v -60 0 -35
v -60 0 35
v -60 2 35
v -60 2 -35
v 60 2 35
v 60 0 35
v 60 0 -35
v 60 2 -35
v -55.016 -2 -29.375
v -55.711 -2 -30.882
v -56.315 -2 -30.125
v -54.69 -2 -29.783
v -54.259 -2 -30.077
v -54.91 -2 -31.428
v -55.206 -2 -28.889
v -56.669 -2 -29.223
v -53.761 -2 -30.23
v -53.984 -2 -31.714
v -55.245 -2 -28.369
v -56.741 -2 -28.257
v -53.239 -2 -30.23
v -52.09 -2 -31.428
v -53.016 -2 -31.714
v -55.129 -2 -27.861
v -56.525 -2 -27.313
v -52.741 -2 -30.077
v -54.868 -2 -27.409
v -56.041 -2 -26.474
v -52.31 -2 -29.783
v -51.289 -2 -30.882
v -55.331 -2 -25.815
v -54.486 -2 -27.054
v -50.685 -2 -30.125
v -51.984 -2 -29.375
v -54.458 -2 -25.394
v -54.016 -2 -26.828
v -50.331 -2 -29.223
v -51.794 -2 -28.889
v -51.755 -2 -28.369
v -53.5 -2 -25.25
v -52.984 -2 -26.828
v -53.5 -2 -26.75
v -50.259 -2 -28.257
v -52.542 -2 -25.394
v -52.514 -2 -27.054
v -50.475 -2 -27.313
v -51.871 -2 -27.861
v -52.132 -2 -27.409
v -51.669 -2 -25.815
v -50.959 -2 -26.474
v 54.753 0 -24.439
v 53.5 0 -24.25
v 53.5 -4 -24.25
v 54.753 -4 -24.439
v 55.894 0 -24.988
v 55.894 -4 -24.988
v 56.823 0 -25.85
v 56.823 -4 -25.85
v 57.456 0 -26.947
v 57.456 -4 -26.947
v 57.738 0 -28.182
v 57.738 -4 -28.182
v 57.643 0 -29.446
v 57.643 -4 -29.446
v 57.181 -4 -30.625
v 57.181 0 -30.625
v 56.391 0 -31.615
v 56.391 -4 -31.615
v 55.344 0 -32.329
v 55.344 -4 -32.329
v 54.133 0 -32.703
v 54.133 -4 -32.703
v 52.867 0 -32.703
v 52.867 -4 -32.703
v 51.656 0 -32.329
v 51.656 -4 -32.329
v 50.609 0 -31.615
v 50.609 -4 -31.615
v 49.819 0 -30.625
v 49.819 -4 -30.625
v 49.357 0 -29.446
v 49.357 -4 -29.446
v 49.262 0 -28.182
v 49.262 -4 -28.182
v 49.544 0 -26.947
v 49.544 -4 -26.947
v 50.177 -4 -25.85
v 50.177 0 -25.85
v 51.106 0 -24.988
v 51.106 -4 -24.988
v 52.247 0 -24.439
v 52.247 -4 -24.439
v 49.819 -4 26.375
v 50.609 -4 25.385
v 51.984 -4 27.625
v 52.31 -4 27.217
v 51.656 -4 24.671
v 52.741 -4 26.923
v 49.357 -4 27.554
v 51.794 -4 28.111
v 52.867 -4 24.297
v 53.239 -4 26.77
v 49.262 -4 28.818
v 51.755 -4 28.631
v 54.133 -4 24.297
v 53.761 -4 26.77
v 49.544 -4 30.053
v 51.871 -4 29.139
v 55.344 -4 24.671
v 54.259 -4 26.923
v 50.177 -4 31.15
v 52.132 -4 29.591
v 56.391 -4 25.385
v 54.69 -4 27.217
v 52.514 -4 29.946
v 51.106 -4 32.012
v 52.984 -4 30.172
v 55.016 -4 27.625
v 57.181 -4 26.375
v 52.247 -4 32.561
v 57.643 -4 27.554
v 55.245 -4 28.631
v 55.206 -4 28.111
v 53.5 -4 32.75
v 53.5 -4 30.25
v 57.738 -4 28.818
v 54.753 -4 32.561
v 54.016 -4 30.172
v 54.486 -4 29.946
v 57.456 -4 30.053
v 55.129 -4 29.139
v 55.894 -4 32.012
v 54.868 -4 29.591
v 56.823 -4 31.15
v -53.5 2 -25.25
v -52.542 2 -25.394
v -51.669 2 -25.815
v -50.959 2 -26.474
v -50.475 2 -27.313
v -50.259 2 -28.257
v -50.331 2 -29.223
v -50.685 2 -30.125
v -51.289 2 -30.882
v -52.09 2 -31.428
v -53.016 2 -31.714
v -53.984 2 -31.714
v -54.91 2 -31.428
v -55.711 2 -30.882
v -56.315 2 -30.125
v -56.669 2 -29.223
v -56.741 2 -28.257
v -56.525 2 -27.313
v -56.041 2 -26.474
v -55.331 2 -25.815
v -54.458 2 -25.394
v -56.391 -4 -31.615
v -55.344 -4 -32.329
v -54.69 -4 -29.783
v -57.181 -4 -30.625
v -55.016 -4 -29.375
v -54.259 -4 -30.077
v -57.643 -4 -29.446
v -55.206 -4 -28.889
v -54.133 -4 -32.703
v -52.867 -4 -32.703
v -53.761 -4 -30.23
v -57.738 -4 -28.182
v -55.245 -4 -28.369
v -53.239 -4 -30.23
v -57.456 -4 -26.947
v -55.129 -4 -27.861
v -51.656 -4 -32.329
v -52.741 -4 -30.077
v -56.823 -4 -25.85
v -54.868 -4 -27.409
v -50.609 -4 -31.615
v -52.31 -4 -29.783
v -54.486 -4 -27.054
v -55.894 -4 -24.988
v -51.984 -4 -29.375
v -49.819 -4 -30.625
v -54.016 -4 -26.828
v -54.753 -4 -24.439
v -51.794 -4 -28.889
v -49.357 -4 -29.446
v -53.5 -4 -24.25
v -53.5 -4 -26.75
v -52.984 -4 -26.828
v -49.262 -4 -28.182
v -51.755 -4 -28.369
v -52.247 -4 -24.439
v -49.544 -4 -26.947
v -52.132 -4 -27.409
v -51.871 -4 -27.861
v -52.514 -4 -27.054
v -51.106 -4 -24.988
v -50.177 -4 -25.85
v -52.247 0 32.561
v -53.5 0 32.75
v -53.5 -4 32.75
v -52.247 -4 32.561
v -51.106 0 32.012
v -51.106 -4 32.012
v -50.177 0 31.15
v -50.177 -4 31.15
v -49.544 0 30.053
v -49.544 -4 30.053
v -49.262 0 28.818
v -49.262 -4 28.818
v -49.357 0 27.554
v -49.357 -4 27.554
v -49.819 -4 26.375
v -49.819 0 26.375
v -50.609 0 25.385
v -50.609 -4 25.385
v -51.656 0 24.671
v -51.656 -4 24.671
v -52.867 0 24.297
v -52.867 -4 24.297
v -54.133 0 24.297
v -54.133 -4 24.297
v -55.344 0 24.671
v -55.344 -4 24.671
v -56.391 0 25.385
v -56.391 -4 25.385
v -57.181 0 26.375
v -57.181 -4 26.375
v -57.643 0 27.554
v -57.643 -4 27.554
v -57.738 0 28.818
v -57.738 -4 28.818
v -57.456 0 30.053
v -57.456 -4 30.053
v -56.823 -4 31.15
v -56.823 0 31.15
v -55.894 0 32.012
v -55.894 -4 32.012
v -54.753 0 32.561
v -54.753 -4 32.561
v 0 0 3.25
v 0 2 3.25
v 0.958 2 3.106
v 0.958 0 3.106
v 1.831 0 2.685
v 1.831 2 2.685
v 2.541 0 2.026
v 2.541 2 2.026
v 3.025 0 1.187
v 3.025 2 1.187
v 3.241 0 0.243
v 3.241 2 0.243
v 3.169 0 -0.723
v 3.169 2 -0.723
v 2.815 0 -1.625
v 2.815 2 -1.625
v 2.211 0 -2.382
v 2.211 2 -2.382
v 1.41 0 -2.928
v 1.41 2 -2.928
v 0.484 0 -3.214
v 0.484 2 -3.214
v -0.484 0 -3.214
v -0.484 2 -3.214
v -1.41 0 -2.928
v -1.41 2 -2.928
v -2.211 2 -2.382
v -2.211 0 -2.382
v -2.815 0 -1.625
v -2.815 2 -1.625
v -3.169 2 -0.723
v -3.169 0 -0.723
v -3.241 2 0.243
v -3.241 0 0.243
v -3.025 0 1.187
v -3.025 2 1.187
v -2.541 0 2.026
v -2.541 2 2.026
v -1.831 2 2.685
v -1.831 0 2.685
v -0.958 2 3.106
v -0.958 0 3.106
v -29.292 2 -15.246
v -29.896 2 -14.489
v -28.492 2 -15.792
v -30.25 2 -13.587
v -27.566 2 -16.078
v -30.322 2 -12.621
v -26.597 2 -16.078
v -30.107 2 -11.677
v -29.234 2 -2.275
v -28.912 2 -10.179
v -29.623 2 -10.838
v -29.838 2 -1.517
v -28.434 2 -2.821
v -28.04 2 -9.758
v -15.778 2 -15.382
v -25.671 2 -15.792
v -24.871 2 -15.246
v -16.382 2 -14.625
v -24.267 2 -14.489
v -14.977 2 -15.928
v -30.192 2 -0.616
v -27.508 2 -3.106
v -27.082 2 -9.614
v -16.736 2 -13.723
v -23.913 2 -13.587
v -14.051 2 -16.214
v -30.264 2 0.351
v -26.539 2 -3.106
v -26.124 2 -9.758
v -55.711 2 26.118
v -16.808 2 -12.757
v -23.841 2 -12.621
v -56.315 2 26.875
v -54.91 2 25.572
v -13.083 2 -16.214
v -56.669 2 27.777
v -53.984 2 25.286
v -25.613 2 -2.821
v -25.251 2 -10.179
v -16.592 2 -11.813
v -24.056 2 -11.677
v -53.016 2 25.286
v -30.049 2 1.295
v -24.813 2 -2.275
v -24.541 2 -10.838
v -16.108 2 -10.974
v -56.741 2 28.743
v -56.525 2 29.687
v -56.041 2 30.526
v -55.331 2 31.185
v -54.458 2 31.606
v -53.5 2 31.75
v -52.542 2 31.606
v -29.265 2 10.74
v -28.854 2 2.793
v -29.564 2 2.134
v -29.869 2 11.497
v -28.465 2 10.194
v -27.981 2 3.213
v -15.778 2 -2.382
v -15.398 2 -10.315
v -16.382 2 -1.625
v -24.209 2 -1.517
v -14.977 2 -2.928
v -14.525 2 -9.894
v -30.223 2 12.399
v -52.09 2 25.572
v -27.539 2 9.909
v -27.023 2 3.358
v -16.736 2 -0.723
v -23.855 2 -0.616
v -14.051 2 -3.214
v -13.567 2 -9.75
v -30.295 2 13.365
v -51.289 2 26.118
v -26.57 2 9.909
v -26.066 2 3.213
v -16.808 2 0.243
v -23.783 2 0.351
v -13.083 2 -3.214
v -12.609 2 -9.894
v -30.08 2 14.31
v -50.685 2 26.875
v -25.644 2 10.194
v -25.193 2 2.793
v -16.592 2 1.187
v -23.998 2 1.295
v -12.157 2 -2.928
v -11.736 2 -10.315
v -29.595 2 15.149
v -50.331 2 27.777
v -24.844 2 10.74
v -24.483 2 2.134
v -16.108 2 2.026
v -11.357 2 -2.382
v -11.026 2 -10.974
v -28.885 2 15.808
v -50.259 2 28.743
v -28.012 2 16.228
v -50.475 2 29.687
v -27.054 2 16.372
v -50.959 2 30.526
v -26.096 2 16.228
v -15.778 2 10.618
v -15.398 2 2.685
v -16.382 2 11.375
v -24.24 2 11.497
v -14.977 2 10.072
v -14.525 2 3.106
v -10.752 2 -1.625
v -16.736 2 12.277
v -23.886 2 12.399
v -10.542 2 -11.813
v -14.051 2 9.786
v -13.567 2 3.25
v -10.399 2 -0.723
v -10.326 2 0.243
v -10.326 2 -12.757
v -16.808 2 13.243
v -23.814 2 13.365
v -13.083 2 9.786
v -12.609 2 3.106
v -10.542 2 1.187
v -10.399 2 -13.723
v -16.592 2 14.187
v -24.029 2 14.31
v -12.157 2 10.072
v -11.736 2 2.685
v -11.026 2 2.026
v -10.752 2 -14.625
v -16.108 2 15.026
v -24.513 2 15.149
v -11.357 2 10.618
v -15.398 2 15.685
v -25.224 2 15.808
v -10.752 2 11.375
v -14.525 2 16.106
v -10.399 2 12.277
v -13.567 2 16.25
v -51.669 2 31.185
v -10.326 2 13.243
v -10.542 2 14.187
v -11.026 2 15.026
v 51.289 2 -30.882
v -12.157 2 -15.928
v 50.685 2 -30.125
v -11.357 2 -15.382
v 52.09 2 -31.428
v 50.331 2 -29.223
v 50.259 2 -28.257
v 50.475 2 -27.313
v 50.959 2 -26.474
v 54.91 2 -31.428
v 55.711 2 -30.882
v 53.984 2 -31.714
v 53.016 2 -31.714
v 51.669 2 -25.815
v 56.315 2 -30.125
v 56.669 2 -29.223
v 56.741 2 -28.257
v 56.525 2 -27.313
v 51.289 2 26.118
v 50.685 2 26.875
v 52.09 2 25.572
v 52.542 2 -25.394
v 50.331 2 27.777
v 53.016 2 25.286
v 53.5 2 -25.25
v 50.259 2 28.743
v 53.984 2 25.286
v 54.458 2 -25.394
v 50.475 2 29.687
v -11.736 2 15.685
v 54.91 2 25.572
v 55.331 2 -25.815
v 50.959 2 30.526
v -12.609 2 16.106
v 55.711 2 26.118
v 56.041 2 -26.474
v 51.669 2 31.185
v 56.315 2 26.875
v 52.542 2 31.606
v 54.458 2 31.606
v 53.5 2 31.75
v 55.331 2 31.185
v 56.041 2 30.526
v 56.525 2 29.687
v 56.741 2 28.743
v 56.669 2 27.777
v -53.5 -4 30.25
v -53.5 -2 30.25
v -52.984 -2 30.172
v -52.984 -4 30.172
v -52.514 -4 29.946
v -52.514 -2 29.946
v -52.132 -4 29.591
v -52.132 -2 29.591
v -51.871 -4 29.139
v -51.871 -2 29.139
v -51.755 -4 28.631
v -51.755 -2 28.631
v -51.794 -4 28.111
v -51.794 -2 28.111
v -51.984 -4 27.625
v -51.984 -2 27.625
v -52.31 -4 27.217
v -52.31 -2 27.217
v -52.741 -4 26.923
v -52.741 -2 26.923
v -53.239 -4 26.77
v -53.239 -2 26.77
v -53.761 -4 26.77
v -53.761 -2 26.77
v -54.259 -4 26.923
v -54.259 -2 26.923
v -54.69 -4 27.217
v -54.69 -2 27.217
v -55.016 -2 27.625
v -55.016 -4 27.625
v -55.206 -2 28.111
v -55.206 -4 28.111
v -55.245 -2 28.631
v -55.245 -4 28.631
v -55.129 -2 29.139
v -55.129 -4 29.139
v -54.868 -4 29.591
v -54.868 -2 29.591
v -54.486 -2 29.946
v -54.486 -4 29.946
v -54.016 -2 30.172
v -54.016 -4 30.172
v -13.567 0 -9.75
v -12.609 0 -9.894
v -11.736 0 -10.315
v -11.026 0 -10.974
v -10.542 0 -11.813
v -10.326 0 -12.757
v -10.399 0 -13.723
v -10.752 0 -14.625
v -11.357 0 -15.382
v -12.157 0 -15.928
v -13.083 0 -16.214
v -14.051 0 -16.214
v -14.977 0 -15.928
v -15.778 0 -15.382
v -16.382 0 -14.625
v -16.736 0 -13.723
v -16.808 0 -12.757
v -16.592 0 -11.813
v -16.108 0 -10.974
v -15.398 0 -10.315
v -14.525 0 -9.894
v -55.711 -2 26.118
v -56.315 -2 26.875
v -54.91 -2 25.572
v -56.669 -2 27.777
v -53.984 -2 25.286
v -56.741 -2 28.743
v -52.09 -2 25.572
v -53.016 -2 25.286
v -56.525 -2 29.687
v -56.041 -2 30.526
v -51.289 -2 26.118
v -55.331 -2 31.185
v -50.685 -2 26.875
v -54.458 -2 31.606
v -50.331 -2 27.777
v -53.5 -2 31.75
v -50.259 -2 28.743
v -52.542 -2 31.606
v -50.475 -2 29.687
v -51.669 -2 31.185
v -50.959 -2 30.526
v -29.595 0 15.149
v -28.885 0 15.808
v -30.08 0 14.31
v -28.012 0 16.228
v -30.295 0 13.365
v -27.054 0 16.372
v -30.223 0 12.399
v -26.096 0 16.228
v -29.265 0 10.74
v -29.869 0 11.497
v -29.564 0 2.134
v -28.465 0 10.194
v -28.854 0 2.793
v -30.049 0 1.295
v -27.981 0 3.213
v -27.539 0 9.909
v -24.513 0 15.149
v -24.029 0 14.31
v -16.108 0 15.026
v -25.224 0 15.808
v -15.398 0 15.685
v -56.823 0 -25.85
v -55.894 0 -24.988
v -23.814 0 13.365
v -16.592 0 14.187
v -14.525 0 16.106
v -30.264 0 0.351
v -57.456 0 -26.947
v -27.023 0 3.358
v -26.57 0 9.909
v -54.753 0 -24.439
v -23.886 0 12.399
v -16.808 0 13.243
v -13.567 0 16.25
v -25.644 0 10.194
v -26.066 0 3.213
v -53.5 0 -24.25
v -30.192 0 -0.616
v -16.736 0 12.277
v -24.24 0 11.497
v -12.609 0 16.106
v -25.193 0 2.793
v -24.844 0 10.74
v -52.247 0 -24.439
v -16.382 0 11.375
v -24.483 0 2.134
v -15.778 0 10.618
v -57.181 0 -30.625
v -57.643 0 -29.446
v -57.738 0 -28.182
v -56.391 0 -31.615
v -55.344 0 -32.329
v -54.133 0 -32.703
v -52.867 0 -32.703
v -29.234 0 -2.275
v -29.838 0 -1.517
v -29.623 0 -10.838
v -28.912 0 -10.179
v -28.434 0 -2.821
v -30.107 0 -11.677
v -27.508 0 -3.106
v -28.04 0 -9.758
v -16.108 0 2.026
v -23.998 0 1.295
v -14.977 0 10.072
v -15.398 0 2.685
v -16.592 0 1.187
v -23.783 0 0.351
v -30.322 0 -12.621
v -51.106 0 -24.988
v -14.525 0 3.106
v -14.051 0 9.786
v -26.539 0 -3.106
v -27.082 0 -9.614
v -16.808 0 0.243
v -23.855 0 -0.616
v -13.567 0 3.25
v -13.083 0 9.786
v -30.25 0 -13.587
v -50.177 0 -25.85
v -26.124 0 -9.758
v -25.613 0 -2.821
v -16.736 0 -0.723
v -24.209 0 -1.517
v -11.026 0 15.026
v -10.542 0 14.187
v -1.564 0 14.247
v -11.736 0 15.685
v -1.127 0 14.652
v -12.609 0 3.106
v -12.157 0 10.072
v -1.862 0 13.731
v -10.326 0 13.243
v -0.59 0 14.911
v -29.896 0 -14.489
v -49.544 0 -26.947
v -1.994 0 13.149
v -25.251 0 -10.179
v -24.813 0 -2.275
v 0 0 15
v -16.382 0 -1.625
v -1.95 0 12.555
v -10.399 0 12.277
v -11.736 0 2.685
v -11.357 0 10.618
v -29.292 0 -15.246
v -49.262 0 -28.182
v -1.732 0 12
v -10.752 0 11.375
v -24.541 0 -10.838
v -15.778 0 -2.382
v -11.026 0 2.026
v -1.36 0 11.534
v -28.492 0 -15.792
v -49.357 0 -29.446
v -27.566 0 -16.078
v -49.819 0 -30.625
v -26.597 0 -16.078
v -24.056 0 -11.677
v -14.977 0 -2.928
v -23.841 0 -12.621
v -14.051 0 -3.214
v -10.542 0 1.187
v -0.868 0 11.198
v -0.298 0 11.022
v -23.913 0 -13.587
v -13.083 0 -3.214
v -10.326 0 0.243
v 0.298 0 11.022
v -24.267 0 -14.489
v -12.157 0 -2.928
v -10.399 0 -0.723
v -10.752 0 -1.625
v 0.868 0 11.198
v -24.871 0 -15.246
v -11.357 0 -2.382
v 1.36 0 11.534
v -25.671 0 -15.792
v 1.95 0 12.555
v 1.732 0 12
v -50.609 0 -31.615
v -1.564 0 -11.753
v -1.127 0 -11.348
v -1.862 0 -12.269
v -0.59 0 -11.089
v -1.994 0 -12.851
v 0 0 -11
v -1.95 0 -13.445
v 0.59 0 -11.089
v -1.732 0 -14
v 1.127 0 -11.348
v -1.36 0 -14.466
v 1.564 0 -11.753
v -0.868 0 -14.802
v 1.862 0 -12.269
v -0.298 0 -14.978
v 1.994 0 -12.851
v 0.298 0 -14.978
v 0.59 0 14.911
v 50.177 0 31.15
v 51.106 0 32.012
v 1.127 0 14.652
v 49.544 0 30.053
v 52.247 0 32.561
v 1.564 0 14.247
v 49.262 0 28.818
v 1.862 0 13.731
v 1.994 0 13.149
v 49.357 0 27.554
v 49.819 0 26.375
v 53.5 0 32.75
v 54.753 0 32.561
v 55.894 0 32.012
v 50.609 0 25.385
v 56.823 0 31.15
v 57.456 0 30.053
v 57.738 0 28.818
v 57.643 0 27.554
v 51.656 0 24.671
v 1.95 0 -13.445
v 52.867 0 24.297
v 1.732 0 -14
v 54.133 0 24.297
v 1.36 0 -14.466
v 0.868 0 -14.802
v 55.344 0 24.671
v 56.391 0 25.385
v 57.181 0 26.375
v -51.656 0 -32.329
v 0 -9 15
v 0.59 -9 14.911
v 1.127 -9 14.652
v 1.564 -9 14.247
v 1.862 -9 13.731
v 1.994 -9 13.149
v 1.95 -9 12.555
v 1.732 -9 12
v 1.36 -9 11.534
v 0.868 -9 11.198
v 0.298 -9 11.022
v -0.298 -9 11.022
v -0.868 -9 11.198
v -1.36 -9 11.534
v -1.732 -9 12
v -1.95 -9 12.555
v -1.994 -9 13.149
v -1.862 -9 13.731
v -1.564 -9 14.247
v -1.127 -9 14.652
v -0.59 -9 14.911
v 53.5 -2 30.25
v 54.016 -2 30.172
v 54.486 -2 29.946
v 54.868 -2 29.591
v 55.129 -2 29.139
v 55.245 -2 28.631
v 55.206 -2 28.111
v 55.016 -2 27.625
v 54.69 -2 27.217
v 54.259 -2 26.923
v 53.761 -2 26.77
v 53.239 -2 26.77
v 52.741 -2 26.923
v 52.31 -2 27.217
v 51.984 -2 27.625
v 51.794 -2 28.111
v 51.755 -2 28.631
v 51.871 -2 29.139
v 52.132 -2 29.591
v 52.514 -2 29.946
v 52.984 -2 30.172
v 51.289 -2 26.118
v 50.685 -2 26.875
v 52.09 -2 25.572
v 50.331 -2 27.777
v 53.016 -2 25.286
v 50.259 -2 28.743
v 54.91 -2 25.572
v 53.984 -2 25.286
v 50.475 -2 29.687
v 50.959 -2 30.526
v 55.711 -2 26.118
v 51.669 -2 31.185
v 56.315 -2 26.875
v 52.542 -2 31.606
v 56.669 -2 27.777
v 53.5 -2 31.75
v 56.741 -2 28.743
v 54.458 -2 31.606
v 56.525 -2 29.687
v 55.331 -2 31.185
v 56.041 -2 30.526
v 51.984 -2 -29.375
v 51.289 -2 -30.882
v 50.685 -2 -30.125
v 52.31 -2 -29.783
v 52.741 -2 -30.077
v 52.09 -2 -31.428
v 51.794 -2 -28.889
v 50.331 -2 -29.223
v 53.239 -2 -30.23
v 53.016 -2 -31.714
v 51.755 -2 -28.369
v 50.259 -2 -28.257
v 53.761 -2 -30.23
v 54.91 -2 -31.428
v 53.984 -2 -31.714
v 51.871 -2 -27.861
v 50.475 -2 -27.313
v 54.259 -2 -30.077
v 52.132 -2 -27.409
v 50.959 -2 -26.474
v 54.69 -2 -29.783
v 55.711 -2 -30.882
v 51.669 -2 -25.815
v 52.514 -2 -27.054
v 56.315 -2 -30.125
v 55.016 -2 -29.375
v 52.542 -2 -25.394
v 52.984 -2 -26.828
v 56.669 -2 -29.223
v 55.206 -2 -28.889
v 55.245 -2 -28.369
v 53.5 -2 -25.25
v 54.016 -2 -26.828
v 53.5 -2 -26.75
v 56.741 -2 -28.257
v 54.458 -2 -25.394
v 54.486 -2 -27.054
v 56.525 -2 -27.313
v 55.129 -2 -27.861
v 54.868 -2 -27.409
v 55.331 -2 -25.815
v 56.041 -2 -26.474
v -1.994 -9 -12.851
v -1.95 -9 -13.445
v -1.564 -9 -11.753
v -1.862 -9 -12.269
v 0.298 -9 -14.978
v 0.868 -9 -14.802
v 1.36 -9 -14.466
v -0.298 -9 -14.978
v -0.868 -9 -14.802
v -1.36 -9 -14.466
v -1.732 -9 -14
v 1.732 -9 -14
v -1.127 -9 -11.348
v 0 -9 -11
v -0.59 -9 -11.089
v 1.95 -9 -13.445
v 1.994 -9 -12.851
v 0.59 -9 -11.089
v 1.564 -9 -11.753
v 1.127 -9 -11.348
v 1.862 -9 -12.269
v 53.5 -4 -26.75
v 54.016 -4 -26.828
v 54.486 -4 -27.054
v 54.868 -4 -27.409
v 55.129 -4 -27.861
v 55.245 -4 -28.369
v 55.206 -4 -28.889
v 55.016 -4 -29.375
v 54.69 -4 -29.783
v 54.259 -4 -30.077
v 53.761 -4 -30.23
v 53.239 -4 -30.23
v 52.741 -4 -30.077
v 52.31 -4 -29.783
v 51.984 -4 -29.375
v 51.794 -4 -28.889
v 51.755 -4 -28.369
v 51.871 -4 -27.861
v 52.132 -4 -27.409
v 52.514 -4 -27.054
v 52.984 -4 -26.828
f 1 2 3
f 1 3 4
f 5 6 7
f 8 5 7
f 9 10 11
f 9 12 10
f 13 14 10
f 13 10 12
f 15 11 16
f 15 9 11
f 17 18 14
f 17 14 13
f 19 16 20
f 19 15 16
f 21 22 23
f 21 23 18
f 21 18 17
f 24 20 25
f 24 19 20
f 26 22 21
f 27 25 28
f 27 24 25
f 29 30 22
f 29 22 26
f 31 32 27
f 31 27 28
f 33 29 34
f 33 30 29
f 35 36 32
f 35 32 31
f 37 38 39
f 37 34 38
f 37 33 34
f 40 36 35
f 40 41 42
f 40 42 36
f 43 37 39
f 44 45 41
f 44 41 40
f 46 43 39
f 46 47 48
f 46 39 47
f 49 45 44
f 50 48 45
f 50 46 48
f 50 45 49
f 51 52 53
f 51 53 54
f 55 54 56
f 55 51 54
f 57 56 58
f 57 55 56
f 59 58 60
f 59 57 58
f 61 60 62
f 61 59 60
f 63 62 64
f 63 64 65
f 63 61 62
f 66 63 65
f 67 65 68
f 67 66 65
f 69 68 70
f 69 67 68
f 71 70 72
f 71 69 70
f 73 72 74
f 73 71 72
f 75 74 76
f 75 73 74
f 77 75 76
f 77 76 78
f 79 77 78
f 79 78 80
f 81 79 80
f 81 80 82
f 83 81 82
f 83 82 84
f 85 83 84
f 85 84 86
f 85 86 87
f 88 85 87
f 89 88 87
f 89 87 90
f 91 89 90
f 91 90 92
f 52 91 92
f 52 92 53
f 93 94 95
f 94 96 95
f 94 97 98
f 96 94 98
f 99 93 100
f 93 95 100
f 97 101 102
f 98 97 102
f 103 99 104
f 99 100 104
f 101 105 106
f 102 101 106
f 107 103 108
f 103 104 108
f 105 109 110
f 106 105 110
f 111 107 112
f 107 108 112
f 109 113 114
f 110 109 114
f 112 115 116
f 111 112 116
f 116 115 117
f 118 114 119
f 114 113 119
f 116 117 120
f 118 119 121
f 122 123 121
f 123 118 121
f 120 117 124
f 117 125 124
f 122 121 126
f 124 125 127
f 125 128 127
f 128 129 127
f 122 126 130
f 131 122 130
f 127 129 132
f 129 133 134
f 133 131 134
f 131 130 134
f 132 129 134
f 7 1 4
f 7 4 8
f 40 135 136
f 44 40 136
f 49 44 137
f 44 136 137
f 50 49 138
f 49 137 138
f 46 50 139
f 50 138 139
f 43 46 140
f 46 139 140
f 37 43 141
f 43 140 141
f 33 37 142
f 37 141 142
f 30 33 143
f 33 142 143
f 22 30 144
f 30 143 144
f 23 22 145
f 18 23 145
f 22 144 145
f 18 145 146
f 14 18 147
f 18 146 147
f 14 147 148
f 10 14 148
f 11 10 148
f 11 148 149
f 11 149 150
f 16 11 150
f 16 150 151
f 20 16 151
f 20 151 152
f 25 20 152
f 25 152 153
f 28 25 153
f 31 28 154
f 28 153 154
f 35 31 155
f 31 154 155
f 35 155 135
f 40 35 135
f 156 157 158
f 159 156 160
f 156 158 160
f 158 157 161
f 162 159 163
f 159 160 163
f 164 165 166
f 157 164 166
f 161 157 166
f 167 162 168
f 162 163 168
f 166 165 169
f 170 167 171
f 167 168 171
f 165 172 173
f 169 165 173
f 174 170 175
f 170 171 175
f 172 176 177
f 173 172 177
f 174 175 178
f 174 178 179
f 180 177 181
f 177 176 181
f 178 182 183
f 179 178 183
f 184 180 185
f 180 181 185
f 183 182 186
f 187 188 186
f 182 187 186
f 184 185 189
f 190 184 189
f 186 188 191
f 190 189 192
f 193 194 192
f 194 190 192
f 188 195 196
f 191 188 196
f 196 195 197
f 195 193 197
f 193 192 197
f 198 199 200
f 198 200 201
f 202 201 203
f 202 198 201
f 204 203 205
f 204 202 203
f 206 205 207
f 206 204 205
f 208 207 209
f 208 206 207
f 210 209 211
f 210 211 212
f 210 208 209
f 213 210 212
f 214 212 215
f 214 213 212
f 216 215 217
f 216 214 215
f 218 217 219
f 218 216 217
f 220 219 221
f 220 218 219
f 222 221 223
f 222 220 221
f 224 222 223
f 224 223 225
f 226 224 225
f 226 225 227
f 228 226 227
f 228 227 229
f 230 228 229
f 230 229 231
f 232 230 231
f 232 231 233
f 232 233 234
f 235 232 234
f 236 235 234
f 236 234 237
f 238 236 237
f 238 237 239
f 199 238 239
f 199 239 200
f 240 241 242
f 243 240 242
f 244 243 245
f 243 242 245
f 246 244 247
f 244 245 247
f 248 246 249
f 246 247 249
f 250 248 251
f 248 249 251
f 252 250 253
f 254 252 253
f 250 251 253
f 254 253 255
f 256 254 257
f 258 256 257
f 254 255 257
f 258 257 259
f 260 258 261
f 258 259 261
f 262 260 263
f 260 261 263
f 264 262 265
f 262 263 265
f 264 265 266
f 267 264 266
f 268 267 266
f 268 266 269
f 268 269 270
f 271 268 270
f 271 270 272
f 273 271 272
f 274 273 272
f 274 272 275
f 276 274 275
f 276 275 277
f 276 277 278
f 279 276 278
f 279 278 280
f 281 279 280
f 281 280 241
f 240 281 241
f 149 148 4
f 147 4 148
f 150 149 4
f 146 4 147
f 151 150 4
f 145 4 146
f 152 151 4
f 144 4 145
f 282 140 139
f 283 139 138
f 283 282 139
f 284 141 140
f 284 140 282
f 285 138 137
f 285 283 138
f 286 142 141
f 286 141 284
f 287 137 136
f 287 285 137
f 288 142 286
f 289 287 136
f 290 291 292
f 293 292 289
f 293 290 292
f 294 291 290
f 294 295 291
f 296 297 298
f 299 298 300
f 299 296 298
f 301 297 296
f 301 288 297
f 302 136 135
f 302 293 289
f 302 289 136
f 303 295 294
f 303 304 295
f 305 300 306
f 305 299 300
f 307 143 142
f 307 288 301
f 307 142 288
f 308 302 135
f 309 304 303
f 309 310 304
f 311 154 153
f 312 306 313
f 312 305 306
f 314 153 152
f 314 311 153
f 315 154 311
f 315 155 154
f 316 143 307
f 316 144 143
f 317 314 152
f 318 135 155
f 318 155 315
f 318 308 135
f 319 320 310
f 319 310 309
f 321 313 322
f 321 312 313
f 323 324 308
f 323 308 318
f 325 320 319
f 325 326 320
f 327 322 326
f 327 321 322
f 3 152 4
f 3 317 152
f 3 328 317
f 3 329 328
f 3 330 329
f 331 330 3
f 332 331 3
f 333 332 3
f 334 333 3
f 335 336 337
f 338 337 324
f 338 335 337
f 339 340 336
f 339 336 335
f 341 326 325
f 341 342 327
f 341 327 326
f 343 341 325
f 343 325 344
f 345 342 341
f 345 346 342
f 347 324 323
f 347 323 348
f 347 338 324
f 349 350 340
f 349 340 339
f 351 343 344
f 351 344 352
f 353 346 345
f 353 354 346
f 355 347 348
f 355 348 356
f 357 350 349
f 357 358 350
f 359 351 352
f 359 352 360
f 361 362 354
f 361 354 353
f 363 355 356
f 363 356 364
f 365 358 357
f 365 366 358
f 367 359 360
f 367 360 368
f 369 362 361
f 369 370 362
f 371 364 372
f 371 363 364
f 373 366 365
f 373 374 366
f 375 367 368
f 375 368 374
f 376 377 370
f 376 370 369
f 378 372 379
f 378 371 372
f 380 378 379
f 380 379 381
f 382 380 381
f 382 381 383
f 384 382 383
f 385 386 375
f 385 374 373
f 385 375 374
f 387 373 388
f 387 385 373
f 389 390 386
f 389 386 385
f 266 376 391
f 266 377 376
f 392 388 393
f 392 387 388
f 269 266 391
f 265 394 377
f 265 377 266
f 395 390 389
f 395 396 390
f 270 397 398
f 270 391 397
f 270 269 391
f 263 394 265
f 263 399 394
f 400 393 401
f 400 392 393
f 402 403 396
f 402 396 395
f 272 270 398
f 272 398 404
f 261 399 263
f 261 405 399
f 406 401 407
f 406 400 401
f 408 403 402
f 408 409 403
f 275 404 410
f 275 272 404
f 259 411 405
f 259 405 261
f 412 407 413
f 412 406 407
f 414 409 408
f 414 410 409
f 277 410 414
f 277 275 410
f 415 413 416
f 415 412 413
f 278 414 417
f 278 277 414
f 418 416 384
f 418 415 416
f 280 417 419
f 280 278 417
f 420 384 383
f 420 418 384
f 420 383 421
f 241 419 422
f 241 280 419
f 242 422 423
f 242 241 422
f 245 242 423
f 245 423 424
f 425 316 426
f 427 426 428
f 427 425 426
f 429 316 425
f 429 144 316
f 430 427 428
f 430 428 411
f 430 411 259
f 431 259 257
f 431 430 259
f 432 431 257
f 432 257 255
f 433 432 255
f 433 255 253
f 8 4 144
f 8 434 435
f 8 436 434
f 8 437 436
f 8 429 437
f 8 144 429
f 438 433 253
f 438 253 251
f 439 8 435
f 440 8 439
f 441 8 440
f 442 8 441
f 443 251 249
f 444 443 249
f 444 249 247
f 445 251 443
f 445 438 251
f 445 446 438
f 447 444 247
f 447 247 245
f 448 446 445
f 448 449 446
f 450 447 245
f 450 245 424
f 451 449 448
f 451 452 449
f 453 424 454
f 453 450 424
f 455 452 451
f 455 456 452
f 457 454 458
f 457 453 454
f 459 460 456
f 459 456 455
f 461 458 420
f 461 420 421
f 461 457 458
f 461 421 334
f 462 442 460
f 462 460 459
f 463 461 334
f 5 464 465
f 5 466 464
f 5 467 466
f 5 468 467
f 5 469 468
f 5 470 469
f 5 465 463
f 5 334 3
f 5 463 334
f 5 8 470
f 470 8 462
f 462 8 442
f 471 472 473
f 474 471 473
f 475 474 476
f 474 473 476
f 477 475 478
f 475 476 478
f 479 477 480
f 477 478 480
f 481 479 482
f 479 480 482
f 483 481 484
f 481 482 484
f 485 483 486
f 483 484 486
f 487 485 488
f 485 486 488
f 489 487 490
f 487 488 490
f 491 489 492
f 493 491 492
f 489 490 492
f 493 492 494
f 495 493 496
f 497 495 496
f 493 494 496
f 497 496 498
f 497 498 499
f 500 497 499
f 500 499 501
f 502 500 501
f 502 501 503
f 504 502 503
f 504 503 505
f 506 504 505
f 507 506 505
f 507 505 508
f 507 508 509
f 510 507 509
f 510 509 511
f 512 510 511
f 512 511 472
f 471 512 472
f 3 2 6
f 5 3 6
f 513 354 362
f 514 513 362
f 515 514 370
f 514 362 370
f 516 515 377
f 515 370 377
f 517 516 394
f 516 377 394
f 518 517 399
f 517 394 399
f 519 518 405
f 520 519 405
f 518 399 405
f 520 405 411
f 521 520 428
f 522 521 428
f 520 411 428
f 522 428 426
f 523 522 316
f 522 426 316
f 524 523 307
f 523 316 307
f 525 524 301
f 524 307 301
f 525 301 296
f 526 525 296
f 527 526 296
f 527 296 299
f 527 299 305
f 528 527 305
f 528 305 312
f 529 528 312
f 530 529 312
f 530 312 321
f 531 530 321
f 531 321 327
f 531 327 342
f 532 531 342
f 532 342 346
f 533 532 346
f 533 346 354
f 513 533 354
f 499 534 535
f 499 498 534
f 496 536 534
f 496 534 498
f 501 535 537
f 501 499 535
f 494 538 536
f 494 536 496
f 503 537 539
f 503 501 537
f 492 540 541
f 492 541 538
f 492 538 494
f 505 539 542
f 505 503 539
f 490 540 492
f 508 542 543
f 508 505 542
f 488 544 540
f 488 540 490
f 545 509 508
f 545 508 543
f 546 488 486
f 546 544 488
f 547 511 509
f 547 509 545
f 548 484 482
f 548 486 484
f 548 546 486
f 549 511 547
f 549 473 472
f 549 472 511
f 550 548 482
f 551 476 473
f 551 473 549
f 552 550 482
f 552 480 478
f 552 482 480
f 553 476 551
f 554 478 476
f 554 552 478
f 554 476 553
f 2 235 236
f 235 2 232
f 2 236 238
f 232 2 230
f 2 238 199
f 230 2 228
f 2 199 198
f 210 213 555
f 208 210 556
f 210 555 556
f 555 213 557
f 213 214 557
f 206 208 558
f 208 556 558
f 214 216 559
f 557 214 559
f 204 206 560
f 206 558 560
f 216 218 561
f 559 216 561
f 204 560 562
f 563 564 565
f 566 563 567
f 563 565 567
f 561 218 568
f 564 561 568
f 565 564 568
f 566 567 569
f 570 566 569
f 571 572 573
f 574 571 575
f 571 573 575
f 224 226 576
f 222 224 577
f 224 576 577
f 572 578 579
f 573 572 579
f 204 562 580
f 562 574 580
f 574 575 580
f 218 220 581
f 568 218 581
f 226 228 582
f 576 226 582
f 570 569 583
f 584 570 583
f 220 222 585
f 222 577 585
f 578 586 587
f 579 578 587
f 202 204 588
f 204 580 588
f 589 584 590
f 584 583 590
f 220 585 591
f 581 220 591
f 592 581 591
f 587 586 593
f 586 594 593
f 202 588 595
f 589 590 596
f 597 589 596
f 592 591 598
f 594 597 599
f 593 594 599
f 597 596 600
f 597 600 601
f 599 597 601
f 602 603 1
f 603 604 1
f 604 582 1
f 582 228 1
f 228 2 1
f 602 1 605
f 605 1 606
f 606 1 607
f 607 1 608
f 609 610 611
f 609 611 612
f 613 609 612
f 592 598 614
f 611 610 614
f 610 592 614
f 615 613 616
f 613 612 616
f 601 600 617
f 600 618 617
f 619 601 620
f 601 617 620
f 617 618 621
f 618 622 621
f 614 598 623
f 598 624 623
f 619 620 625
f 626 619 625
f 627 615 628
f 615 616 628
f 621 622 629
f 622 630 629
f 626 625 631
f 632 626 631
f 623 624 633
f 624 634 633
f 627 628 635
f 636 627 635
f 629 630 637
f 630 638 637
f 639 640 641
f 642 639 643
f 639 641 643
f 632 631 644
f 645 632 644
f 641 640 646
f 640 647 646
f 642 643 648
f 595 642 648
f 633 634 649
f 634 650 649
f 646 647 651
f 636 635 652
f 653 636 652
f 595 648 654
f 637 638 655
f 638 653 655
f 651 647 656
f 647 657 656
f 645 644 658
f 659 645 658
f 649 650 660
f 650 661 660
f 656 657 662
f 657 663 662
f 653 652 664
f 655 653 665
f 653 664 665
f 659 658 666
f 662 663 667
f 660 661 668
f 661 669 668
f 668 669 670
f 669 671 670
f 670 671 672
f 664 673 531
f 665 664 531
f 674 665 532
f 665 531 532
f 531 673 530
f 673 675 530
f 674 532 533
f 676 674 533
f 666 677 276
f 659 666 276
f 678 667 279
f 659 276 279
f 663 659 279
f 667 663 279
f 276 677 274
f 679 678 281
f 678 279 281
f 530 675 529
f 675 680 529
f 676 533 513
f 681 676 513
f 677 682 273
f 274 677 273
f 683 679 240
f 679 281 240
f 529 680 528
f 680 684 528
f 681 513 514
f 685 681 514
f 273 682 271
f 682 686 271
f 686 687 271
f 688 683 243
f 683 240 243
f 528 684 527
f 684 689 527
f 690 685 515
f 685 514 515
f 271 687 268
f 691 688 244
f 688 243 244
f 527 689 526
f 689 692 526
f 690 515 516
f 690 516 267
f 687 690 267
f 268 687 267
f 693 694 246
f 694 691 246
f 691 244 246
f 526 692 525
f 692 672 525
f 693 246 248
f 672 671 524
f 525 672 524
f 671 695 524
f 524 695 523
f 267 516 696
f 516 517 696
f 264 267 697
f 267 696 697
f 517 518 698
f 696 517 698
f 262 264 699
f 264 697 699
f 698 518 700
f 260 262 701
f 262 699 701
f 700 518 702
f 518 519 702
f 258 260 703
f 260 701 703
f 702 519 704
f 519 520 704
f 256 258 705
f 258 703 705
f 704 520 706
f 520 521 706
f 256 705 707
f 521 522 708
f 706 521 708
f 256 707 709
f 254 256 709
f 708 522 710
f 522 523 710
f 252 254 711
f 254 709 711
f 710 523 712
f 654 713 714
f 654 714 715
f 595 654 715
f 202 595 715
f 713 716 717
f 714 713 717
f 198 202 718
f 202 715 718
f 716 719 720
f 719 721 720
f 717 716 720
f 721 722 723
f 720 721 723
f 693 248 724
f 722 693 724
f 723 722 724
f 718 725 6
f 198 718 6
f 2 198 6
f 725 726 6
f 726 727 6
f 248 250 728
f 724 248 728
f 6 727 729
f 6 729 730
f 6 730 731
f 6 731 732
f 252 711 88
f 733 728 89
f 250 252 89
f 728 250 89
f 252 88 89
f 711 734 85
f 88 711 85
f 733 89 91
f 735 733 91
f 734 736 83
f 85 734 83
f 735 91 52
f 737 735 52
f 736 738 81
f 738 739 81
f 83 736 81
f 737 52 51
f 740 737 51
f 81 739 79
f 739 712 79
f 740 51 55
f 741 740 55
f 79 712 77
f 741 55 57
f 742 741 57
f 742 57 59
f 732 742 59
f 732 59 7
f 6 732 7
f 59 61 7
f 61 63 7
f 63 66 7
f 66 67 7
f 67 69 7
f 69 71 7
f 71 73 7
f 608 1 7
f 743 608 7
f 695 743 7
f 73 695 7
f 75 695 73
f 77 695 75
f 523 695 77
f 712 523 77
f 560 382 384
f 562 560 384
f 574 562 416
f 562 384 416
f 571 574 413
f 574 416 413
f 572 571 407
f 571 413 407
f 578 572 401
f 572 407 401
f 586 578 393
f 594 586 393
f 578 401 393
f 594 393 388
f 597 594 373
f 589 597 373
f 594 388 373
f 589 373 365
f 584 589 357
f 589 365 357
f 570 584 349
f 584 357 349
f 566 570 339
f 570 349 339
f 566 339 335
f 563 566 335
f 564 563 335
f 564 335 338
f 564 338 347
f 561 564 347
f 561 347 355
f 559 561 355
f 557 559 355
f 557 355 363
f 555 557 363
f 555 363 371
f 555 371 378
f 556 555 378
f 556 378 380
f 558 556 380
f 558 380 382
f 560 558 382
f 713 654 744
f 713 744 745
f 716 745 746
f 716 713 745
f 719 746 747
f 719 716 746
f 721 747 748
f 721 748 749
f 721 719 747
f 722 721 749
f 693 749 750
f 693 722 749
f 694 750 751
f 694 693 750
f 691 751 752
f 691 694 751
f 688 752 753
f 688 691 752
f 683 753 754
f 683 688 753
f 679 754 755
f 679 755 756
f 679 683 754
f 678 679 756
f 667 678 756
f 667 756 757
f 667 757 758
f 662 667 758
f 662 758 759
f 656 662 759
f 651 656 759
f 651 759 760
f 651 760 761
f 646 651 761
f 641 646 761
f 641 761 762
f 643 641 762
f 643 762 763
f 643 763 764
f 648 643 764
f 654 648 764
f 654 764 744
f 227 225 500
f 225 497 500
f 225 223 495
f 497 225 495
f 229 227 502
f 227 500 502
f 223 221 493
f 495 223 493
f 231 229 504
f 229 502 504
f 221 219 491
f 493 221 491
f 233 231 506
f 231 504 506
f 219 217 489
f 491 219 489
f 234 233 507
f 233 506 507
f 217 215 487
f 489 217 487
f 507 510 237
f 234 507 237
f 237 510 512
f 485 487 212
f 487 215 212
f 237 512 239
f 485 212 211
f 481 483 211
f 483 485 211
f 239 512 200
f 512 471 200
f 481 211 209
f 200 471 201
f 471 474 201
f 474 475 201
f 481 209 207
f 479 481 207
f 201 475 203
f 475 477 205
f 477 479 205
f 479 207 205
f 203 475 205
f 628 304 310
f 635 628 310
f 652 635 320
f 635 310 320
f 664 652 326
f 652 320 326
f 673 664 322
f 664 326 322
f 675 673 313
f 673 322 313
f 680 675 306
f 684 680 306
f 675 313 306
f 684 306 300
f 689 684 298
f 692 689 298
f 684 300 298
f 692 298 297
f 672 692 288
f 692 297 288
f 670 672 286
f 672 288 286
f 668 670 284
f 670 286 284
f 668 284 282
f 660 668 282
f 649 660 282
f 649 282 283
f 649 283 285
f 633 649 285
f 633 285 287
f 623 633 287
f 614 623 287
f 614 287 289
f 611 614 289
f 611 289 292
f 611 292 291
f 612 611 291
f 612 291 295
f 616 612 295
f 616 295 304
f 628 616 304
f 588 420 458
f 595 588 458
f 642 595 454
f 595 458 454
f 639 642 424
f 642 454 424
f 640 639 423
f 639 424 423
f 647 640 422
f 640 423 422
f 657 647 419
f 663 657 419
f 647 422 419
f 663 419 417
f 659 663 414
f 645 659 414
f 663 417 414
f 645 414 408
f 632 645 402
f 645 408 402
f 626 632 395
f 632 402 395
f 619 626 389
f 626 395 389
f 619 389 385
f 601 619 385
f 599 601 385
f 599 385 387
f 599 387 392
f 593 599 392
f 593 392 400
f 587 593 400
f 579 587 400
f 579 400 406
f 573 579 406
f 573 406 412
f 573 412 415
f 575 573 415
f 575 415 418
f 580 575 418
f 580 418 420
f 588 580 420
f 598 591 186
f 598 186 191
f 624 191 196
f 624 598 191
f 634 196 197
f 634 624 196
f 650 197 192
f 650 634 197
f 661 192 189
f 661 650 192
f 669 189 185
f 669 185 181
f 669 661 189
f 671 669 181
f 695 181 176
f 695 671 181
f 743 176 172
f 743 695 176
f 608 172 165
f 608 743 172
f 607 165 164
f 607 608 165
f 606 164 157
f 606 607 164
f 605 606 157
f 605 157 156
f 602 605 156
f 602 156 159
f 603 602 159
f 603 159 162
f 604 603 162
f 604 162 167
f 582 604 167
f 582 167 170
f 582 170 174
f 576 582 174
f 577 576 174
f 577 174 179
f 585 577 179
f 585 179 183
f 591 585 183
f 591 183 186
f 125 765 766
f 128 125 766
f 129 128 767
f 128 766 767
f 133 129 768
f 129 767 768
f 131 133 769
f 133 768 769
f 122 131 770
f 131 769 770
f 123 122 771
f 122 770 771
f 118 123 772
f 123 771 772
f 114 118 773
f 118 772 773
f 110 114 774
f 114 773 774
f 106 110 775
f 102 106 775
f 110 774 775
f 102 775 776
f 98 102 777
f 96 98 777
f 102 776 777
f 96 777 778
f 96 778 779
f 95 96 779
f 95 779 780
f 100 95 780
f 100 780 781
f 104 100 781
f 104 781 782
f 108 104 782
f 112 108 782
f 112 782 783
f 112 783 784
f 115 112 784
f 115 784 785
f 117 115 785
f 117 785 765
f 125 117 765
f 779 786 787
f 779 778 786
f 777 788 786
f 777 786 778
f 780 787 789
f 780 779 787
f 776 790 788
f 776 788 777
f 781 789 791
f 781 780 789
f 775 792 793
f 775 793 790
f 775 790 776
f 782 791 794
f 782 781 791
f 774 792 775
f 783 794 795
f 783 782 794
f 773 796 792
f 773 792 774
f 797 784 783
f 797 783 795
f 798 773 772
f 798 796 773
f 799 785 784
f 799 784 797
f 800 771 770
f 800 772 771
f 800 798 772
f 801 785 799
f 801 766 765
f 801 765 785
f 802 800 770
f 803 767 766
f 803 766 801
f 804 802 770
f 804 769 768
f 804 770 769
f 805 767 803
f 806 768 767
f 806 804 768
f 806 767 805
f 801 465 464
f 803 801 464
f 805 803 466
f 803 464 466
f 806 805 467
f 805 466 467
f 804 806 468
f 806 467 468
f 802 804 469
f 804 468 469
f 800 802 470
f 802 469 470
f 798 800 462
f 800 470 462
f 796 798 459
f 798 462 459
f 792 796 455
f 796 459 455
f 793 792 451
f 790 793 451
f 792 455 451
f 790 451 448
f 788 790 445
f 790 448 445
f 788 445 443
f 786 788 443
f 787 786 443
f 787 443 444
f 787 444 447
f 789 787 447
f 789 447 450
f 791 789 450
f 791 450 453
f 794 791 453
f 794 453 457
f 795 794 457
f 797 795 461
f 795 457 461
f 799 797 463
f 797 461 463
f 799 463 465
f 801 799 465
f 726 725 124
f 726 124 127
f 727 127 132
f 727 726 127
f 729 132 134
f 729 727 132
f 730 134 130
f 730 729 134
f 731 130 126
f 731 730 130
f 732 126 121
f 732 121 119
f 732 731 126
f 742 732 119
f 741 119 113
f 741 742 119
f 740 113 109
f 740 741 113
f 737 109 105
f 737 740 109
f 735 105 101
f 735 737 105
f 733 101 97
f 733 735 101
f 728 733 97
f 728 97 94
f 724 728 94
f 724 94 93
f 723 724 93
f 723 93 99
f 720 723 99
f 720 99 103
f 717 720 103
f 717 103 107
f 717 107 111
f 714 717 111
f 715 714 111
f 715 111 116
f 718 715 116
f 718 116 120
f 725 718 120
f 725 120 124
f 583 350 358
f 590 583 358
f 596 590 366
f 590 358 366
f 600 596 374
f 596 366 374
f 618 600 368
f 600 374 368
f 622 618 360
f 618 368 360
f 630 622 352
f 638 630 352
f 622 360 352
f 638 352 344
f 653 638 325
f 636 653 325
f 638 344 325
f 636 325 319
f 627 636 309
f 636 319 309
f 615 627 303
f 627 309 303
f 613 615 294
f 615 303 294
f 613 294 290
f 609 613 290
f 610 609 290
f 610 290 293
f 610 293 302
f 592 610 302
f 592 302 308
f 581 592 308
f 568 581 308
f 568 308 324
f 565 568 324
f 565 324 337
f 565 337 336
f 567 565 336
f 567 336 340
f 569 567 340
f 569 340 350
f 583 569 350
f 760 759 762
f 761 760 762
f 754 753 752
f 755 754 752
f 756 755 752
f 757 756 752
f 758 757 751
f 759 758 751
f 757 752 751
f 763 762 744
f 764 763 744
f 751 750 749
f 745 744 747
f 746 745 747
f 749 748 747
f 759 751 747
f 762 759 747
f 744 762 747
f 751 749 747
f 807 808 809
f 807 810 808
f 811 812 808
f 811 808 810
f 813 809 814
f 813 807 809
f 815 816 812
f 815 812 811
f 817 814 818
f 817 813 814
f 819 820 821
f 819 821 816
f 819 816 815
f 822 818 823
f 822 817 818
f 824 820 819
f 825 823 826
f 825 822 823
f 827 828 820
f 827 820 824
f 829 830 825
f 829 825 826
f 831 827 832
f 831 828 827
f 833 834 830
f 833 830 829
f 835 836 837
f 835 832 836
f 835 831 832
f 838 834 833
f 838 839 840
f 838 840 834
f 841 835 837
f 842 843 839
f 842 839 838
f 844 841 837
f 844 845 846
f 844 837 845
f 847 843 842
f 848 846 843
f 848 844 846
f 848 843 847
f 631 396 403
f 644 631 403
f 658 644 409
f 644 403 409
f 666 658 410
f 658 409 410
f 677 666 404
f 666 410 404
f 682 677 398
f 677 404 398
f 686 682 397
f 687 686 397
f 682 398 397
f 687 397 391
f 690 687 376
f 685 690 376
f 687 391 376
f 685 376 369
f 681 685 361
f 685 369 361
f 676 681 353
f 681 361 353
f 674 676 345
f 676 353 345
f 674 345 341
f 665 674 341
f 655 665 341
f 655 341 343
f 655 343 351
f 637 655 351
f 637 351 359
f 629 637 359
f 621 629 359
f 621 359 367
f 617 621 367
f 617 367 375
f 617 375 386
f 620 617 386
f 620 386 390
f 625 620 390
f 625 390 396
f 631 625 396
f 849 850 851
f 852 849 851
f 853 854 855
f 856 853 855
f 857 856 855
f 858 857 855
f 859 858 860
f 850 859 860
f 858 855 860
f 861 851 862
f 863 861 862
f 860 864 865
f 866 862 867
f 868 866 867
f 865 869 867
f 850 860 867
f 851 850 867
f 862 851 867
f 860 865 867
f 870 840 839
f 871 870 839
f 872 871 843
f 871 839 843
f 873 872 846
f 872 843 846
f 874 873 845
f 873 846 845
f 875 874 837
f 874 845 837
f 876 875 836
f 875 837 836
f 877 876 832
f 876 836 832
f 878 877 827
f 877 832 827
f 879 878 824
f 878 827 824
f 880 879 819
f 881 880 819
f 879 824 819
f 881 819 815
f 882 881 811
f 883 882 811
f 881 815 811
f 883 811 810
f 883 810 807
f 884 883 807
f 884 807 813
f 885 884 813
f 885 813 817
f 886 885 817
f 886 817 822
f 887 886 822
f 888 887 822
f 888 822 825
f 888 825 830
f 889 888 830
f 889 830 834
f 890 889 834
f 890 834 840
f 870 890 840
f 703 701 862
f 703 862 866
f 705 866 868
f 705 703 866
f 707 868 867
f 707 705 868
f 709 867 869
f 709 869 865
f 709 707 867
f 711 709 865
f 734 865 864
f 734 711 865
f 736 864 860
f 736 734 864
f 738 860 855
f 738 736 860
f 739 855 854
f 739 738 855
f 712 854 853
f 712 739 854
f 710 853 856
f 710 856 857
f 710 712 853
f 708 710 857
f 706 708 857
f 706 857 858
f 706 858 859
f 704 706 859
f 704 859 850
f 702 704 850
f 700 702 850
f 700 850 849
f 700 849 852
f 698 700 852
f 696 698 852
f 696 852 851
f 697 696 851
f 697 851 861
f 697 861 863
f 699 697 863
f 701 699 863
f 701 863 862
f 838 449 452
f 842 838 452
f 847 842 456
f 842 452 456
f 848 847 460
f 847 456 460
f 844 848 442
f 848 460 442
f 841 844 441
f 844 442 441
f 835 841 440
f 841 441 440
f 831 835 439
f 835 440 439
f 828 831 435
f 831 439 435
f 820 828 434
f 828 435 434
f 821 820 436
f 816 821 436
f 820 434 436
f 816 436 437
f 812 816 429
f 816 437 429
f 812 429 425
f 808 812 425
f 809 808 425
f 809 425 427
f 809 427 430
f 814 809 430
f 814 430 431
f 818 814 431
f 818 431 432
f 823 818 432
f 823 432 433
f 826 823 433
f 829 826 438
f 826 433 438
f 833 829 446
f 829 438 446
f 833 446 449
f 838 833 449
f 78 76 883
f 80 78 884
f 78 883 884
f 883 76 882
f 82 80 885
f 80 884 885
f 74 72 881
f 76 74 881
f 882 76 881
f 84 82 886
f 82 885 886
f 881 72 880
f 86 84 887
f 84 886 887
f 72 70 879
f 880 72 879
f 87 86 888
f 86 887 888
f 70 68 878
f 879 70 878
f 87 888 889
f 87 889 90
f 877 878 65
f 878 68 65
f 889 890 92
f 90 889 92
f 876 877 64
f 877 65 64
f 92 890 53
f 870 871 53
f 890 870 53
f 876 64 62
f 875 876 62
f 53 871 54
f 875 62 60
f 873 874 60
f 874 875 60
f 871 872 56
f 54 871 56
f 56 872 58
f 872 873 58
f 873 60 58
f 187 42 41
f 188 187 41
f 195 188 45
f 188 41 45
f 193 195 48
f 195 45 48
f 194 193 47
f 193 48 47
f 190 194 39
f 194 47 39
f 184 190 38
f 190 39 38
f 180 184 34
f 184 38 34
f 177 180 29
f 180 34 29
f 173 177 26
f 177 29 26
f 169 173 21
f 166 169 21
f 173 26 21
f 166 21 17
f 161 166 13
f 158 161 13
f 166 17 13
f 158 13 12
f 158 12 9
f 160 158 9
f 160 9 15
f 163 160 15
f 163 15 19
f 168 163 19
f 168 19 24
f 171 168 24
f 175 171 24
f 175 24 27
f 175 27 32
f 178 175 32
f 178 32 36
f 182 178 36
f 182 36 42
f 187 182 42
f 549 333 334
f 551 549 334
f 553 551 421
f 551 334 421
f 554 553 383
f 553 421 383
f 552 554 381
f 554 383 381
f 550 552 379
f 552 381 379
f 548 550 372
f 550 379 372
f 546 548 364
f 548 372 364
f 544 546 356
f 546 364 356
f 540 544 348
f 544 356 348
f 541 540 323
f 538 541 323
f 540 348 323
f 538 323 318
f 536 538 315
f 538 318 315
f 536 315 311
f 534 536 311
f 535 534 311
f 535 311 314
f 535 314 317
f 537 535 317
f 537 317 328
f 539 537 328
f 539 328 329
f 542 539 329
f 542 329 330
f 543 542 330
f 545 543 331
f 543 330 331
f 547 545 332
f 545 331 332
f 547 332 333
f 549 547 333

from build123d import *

# Parameters (mm, degrees)
SKETCH1_W           = 120
SKETCH1_H           = 70
BOSS_EXTRUDE1_DEPTH = 2
SKETCH6_R           = 2
BOSS_EXTRUDE2_DEPTH = 11
SKETCH4_R           = 3.25
CUT_EXTRUDE2_DEPTH  = 11
SKETCH3_R           = 4.25
BOSS_EXTRUDE3_DEPTH = 6
SKETCH8_R           = 1.75
CUT_EXTRUDE6_DEPTH  = 8
SKETCH9_R           = 3.25
CUT_EXTRUDE8_DEPTH  = 4


with BuildPart() as part:
    # Sketch1 → Boss-Extrude1 (new body)
    with BuildSketch(Plane(origin=(0, 0, 0), x_dir=(1, 0, 0), z_dir=(0, 1, 0))):
        Rectangle(SKETCH1_W, SKETCH1_H)
    extrude(amount=BOSS_EXTRUDE1_DEPTH)

    # Sketch6 → Boss-Extrude2 (add)
    with BuildSketch(Plane(origin=(0, 2, 0), x_dir=(1, 0, 0), z_dir=(0, 1, 0))):
        with Locations(Location((0, -13, 0), (0, 0, 270))):
            Circle(SKETCH6_R)
        with Locations(Location((0, 13, 0), (0, 0, 270))):
            Circle(SKETCH6_R)
    extrude(amount=-BOSS_EXTRUDE2_DEPTH)

    # Sketch4 → Cut-Extrude2 (cut)
    with BuildSketch(Plane(origin=(0, 2, 0), x_dir=(1, 0, 0), z_dir=(0, 1, 0))):
        with Locations(Location((-27.054448087, -13.122273409, 0), (0, 0, 270))):
            Circle(SKETCH4_R)
        with Locations(Location((-27.023483048, -0.10764713, 0), (0, 0, 270))):
            Circle(SKETCH4_R)
        with Locations(Location((-27.081562274, 12.864019897, 0), (0, 0, 270))):
            Circle(SKETCH4_R)
        with Locations(Location((-13.567081484, 0, 0), (0, 0, 270))):
            Circle(SKETCH4_R)
        with Locations(Location((-13.567081484, -13, 0), (0, 0, 270))):
            Circle(SKETCH4_R)
        with Locations(Location((-13.567081484, 13, 0), (0, 0, 270))):
            Circle(SKETCH4_R)
        with Locations(Location((0, 0, 0), (0, 0, 270))):
            Circle(SKETCH4_R)
    extrude(amount=-CUT_EXTRUDE2_DEPTH, mode=Mode.SUBTRACT)

    # Sketch3 → Boss-Extrude3 (add)
    with BuildSketch(Plane(origin=(0, 2, 0), x_dir=(1, 0, 0), z_dir=(0, 1, 0))):
        with Locations(Location((-53.5, 28.5, 0), (0, 0, 270))):
            Circle(SKETCH3_R)
        with Locations(Location((53.5, 28.5, 0), (0, 0, 270))):
            Circle(SKETCH3_R)
        with Locations(Location((-53.5, -28.5, 0), (0, 0, 270))):
            Circle(SKETCH3_R)
        with Locations(Location((53.5, -28.5, 0), (0, 0, 270))):
            Circle(SKETCH3_R)
    extrude(amount=-BOSS_EXTRUDE3_DEPTH)

    # Sketch8 → Cut-Extrude6 (cut)
    with BuildSketch(Plane(origin=(0, 2, 0), x_dir=(1, 0, 0), z_dir=(0, 1, 0))):
        with Locations(Location((-53.5, 28.5, 0), (0, 0, 270))):
            Circle(SKETCH8_R)
        with Locations(Location((-53.5, -28.5, 0), (0, 0, 270))):
            Circle(SKETCH8_R)
        with Locations(Location((53.5, -28.5, 0), (0, 0, 270))):
            Circle(SKETCH8_R)
        with Locations(Location((53.5, 28.5, 0), (0, 0, 270))):
            Circle(SKETCH8_R)
    extrude(amount=-CUT_EXTRUDE6_DEPTH, mode=Mode.SUBTRACT)

    # Sketch9 → Cut-Extrude8 (cut)
    with BuildSketch(Plane(origin=(0, 2, 0), x_dir=(1, 0, 0), z_dir=(0, 1, 0))):
        with Locations(Location((-53.5, 28.5, 0), (0, 0, 270))):
            Circle(SKETCH9_R)
        with Locations(Location((53.5, 28.5, 0), (0, 0, 270))):
            Circle(SKETCH9_R)
        with Locations(Location((-53.5, -28.5, 0), (0, 0, 270))):
            Circle(SKETCH9_R)
        with Locations(Location((53.5, -28.5, 0), (0, 0, 270))):
            Circle(SKETCH9_R)
    extrude(amount=-CUT_EXTRUDE8_DEPTH, mode=Mode.SUBTRACT)


solid = part.part
